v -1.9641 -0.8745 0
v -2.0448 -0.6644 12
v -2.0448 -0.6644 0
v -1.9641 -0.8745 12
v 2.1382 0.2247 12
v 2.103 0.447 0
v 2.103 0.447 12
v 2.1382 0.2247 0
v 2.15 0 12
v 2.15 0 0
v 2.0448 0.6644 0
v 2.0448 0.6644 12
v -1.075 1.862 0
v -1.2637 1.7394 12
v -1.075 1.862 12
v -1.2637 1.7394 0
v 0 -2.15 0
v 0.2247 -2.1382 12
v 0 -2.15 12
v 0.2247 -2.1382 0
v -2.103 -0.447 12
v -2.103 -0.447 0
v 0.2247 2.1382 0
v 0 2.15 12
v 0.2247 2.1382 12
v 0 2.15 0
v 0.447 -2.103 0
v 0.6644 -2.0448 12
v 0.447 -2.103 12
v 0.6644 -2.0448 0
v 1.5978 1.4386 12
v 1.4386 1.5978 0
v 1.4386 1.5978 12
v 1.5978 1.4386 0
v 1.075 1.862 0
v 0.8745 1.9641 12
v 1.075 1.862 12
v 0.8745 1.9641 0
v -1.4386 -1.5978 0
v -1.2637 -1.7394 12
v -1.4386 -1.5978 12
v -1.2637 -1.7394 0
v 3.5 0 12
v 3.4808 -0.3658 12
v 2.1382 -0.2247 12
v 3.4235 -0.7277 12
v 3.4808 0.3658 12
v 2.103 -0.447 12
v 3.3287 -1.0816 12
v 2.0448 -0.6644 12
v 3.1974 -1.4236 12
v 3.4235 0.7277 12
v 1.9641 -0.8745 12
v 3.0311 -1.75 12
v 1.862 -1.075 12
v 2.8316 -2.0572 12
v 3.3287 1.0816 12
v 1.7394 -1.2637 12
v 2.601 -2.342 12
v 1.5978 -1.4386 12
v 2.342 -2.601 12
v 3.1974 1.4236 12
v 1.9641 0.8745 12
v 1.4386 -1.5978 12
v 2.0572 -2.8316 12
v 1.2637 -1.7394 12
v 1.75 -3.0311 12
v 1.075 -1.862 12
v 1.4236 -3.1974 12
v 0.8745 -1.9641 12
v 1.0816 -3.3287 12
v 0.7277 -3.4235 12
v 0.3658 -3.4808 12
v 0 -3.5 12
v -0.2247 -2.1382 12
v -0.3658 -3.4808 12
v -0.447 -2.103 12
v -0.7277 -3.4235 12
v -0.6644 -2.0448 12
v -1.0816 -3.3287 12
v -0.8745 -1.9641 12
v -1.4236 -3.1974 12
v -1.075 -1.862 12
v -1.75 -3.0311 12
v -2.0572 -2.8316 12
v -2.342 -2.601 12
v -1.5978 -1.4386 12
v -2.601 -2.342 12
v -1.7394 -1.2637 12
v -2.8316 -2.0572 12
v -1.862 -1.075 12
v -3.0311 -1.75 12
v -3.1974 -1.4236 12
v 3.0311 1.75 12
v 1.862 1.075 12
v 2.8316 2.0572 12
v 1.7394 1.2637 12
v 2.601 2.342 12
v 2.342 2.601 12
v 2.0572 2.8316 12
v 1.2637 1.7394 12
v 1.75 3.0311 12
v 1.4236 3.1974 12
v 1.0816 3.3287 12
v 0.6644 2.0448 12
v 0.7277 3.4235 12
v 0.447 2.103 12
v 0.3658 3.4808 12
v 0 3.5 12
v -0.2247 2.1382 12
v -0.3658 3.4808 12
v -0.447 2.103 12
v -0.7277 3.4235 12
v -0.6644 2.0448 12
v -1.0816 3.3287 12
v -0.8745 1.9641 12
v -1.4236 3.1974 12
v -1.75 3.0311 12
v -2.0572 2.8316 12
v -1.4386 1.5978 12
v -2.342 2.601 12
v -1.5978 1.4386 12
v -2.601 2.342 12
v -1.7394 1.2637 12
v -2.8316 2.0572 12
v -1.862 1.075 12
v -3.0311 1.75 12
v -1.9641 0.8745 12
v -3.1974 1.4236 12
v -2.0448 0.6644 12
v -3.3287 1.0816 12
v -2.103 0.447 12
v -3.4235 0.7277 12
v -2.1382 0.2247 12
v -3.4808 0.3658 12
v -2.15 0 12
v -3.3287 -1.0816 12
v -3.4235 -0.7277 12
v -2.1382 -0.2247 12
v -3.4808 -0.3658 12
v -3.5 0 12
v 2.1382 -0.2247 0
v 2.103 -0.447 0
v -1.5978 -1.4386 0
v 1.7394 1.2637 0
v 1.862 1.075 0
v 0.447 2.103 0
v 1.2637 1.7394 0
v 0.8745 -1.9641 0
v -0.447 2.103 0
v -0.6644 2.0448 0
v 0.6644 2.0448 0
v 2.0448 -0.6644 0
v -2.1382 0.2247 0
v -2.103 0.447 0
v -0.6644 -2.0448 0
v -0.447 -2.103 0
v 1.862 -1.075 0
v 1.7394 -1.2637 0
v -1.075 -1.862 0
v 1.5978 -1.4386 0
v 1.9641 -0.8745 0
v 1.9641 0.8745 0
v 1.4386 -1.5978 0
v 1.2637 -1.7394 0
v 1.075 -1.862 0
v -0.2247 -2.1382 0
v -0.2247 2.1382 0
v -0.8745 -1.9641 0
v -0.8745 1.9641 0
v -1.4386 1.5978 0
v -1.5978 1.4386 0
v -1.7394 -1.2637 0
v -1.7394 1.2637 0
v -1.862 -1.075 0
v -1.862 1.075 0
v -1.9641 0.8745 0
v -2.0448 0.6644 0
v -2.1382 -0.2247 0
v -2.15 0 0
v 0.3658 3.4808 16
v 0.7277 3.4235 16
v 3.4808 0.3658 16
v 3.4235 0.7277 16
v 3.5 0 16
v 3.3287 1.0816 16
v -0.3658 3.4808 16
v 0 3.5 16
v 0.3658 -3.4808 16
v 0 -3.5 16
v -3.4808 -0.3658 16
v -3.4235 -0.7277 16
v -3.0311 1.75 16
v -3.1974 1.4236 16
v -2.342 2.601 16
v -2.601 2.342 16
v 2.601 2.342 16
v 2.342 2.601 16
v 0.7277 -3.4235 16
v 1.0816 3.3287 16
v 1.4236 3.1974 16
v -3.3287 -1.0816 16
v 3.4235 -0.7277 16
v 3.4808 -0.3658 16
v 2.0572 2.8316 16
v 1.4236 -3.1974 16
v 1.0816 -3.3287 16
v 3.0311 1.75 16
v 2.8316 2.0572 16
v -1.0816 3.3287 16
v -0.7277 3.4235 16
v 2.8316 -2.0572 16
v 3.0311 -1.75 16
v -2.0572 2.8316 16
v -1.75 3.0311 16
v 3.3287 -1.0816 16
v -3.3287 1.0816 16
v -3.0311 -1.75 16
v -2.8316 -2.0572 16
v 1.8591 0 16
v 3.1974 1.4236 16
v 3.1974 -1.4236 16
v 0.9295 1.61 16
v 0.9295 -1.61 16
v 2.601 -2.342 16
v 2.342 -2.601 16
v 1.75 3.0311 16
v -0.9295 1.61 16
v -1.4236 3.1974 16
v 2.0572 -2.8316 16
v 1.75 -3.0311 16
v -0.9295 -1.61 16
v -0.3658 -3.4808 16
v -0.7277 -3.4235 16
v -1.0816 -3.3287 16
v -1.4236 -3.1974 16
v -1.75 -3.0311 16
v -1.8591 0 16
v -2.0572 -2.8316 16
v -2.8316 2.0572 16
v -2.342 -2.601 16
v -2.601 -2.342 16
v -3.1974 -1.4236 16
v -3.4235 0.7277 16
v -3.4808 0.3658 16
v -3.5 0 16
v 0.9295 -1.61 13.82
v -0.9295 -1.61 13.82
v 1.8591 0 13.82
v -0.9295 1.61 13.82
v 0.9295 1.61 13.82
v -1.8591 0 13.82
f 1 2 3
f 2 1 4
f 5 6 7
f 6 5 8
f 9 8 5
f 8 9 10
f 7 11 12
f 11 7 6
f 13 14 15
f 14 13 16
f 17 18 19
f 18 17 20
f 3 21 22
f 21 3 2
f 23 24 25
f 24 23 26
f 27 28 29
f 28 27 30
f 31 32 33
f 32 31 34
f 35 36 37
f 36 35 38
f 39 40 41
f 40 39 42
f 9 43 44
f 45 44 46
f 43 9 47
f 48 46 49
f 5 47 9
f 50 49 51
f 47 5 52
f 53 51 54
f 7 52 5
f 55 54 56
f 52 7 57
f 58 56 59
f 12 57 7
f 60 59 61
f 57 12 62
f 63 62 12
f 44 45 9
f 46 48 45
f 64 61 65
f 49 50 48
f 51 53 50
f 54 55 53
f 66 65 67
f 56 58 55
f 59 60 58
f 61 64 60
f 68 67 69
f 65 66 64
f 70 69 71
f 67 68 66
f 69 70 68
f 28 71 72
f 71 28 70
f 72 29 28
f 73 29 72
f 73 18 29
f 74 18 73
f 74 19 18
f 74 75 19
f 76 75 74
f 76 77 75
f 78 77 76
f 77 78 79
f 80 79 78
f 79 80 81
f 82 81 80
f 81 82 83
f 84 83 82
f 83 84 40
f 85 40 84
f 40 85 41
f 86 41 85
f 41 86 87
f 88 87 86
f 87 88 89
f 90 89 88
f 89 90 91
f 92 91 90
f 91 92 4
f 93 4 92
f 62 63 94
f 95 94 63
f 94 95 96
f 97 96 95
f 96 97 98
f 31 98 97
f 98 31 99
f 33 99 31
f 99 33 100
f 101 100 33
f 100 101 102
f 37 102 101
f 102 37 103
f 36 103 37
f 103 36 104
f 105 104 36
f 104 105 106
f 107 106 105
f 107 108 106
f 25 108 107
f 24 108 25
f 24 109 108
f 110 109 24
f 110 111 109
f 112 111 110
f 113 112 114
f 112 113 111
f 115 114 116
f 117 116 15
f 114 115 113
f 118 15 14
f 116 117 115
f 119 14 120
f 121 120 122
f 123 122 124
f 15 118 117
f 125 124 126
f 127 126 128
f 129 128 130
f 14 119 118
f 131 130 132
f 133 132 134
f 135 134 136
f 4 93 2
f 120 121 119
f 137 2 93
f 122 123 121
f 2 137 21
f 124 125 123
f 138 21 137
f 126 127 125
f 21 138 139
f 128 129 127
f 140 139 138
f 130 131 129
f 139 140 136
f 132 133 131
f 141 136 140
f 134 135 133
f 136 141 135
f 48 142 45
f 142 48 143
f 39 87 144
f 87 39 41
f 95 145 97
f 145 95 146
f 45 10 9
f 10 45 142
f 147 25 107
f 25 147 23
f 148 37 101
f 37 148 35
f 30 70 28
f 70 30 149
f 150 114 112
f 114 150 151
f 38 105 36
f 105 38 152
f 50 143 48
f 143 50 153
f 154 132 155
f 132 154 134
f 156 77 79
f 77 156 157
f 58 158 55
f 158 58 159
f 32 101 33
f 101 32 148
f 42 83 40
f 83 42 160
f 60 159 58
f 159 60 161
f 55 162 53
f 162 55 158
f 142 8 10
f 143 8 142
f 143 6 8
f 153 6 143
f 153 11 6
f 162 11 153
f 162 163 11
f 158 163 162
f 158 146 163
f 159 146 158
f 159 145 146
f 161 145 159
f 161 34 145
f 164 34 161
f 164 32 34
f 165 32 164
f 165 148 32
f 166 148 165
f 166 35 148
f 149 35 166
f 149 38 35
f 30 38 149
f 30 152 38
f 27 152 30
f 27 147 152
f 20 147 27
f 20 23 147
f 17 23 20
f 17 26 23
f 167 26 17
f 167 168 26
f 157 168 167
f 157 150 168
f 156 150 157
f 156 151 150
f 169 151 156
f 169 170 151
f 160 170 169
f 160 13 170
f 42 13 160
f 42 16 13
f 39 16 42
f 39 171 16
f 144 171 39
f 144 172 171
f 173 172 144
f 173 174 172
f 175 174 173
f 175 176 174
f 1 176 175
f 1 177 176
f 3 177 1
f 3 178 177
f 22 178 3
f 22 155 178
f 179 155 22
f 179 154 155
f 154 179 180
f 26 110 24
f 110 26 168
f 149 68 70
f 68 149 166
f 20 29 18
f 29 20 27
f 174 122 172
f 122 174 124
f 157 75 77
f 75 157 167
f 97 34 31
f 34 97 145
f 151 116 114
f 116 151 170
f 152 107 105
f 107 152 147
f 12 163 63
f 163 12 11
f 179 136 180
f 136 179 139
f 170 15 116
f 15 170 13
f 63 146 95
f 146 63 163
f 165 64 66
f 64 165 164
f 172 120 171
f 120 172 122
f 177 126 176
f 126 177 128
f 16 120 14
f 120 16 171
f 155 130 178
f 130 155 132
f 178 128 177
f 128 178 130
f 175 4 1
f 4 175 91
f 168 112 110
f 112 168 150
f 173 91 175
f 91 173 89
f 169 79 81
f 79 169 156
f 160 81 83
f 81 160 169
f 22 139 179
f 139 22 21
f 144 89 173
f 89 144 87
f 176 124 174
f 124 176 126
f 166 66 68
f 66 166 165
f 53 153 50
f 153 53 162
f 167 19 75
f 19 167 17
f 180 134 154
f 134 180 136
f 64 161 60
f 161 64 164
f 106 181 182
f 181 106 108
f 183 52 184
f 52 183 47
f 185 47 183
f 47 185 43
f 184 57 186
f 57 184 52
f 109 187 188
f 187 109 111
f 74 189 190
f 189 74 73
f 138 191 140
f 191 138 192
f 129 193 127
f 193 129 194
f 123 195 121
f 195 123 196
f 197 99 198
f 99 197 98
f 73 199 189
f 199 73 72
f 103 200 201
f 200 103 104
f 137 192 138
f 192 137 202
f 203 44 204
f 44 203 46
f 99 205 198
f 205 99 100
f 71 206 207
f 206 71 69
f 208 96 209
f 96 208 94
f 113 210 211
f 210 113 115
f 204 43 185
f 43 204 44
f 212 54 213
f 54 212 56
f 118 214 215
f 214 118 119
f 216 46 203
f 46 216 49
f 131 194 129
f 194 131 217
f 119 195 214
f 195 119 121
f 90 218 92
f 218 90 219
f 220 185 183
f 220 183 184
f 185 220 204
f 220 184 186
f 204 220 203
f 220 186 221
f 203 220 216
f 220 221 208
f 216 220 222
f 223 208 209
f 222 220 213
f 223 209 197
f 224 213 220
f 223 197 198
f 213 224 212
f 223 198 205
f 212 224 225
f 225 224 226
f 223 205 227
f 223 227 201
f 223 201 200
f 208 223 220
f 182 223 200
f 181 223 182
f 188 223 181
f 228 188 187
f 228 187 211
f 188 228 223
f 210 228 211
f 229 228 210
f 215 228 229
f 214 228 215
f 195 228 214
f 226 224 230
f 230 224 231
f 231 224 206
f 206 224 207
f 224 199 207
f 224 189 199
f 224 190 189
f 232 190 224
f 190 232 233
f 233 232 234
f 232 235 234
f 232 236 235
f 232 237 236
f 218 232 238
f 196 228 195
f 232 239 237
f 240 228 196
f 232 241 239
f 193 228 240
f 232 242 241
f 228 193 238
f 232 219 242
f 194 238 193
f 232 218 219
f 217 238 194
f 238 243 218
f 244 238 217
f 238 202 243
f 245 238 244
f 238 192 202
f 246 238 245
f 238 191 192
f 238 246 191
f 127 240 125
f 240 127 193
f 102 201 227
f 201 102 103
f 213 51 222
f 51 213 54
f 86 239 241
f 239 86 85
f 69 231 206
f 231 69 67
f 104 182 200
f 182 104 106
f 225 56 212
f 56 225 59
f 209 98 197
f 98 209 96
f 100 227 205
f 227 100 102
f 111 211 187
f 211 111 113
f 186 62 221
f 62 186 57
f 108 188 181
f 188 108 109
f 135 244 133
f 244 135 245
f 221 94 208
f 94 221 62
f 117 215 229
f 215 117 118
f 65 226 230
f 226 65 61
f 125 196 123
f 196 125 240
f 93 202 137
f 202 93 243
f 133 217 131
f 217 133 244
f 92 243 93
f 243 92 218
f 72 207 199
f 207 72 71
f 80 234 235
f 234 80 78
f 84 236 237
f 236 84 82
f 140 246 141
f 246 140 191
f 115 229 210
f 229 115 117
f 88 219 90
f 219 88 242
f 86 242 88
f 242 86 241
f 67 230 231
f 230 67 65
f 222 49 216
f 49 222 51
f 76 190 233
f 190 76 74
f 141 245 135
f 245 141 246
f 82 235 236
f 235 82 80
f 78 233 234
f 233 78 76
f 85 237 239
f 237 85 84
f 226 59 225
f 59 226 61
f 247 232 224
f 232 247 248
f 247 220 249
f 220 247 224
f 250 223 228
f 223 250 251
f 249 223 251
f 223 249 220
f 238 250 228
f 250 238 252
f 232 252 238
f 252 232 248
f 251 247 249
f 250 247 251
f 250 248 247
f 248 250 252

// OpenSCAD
// Socket-head cap screw, smooth printable representation.
$fn = 60;
eps = 0.02;
shaft_d = 4.3;
head_d = 7;
head_h = 4;
shaft_l = 12;
socket_flat = head_d * 0.46;
socket_depth = head_h * 0.55;
difference() {
    union() {
        cylinder(d = shaft_d, h = shaft_l);
        translate([0, 0, shaft_l]) cylinder(d = head_d, h = head_h);
    }
    translate([0, 0, shaft_l + head_h - socket_depth + eps])
        cylinder(d = socket_flat / cos(30), h = socket_depth + eps, $fn = 6);
}
